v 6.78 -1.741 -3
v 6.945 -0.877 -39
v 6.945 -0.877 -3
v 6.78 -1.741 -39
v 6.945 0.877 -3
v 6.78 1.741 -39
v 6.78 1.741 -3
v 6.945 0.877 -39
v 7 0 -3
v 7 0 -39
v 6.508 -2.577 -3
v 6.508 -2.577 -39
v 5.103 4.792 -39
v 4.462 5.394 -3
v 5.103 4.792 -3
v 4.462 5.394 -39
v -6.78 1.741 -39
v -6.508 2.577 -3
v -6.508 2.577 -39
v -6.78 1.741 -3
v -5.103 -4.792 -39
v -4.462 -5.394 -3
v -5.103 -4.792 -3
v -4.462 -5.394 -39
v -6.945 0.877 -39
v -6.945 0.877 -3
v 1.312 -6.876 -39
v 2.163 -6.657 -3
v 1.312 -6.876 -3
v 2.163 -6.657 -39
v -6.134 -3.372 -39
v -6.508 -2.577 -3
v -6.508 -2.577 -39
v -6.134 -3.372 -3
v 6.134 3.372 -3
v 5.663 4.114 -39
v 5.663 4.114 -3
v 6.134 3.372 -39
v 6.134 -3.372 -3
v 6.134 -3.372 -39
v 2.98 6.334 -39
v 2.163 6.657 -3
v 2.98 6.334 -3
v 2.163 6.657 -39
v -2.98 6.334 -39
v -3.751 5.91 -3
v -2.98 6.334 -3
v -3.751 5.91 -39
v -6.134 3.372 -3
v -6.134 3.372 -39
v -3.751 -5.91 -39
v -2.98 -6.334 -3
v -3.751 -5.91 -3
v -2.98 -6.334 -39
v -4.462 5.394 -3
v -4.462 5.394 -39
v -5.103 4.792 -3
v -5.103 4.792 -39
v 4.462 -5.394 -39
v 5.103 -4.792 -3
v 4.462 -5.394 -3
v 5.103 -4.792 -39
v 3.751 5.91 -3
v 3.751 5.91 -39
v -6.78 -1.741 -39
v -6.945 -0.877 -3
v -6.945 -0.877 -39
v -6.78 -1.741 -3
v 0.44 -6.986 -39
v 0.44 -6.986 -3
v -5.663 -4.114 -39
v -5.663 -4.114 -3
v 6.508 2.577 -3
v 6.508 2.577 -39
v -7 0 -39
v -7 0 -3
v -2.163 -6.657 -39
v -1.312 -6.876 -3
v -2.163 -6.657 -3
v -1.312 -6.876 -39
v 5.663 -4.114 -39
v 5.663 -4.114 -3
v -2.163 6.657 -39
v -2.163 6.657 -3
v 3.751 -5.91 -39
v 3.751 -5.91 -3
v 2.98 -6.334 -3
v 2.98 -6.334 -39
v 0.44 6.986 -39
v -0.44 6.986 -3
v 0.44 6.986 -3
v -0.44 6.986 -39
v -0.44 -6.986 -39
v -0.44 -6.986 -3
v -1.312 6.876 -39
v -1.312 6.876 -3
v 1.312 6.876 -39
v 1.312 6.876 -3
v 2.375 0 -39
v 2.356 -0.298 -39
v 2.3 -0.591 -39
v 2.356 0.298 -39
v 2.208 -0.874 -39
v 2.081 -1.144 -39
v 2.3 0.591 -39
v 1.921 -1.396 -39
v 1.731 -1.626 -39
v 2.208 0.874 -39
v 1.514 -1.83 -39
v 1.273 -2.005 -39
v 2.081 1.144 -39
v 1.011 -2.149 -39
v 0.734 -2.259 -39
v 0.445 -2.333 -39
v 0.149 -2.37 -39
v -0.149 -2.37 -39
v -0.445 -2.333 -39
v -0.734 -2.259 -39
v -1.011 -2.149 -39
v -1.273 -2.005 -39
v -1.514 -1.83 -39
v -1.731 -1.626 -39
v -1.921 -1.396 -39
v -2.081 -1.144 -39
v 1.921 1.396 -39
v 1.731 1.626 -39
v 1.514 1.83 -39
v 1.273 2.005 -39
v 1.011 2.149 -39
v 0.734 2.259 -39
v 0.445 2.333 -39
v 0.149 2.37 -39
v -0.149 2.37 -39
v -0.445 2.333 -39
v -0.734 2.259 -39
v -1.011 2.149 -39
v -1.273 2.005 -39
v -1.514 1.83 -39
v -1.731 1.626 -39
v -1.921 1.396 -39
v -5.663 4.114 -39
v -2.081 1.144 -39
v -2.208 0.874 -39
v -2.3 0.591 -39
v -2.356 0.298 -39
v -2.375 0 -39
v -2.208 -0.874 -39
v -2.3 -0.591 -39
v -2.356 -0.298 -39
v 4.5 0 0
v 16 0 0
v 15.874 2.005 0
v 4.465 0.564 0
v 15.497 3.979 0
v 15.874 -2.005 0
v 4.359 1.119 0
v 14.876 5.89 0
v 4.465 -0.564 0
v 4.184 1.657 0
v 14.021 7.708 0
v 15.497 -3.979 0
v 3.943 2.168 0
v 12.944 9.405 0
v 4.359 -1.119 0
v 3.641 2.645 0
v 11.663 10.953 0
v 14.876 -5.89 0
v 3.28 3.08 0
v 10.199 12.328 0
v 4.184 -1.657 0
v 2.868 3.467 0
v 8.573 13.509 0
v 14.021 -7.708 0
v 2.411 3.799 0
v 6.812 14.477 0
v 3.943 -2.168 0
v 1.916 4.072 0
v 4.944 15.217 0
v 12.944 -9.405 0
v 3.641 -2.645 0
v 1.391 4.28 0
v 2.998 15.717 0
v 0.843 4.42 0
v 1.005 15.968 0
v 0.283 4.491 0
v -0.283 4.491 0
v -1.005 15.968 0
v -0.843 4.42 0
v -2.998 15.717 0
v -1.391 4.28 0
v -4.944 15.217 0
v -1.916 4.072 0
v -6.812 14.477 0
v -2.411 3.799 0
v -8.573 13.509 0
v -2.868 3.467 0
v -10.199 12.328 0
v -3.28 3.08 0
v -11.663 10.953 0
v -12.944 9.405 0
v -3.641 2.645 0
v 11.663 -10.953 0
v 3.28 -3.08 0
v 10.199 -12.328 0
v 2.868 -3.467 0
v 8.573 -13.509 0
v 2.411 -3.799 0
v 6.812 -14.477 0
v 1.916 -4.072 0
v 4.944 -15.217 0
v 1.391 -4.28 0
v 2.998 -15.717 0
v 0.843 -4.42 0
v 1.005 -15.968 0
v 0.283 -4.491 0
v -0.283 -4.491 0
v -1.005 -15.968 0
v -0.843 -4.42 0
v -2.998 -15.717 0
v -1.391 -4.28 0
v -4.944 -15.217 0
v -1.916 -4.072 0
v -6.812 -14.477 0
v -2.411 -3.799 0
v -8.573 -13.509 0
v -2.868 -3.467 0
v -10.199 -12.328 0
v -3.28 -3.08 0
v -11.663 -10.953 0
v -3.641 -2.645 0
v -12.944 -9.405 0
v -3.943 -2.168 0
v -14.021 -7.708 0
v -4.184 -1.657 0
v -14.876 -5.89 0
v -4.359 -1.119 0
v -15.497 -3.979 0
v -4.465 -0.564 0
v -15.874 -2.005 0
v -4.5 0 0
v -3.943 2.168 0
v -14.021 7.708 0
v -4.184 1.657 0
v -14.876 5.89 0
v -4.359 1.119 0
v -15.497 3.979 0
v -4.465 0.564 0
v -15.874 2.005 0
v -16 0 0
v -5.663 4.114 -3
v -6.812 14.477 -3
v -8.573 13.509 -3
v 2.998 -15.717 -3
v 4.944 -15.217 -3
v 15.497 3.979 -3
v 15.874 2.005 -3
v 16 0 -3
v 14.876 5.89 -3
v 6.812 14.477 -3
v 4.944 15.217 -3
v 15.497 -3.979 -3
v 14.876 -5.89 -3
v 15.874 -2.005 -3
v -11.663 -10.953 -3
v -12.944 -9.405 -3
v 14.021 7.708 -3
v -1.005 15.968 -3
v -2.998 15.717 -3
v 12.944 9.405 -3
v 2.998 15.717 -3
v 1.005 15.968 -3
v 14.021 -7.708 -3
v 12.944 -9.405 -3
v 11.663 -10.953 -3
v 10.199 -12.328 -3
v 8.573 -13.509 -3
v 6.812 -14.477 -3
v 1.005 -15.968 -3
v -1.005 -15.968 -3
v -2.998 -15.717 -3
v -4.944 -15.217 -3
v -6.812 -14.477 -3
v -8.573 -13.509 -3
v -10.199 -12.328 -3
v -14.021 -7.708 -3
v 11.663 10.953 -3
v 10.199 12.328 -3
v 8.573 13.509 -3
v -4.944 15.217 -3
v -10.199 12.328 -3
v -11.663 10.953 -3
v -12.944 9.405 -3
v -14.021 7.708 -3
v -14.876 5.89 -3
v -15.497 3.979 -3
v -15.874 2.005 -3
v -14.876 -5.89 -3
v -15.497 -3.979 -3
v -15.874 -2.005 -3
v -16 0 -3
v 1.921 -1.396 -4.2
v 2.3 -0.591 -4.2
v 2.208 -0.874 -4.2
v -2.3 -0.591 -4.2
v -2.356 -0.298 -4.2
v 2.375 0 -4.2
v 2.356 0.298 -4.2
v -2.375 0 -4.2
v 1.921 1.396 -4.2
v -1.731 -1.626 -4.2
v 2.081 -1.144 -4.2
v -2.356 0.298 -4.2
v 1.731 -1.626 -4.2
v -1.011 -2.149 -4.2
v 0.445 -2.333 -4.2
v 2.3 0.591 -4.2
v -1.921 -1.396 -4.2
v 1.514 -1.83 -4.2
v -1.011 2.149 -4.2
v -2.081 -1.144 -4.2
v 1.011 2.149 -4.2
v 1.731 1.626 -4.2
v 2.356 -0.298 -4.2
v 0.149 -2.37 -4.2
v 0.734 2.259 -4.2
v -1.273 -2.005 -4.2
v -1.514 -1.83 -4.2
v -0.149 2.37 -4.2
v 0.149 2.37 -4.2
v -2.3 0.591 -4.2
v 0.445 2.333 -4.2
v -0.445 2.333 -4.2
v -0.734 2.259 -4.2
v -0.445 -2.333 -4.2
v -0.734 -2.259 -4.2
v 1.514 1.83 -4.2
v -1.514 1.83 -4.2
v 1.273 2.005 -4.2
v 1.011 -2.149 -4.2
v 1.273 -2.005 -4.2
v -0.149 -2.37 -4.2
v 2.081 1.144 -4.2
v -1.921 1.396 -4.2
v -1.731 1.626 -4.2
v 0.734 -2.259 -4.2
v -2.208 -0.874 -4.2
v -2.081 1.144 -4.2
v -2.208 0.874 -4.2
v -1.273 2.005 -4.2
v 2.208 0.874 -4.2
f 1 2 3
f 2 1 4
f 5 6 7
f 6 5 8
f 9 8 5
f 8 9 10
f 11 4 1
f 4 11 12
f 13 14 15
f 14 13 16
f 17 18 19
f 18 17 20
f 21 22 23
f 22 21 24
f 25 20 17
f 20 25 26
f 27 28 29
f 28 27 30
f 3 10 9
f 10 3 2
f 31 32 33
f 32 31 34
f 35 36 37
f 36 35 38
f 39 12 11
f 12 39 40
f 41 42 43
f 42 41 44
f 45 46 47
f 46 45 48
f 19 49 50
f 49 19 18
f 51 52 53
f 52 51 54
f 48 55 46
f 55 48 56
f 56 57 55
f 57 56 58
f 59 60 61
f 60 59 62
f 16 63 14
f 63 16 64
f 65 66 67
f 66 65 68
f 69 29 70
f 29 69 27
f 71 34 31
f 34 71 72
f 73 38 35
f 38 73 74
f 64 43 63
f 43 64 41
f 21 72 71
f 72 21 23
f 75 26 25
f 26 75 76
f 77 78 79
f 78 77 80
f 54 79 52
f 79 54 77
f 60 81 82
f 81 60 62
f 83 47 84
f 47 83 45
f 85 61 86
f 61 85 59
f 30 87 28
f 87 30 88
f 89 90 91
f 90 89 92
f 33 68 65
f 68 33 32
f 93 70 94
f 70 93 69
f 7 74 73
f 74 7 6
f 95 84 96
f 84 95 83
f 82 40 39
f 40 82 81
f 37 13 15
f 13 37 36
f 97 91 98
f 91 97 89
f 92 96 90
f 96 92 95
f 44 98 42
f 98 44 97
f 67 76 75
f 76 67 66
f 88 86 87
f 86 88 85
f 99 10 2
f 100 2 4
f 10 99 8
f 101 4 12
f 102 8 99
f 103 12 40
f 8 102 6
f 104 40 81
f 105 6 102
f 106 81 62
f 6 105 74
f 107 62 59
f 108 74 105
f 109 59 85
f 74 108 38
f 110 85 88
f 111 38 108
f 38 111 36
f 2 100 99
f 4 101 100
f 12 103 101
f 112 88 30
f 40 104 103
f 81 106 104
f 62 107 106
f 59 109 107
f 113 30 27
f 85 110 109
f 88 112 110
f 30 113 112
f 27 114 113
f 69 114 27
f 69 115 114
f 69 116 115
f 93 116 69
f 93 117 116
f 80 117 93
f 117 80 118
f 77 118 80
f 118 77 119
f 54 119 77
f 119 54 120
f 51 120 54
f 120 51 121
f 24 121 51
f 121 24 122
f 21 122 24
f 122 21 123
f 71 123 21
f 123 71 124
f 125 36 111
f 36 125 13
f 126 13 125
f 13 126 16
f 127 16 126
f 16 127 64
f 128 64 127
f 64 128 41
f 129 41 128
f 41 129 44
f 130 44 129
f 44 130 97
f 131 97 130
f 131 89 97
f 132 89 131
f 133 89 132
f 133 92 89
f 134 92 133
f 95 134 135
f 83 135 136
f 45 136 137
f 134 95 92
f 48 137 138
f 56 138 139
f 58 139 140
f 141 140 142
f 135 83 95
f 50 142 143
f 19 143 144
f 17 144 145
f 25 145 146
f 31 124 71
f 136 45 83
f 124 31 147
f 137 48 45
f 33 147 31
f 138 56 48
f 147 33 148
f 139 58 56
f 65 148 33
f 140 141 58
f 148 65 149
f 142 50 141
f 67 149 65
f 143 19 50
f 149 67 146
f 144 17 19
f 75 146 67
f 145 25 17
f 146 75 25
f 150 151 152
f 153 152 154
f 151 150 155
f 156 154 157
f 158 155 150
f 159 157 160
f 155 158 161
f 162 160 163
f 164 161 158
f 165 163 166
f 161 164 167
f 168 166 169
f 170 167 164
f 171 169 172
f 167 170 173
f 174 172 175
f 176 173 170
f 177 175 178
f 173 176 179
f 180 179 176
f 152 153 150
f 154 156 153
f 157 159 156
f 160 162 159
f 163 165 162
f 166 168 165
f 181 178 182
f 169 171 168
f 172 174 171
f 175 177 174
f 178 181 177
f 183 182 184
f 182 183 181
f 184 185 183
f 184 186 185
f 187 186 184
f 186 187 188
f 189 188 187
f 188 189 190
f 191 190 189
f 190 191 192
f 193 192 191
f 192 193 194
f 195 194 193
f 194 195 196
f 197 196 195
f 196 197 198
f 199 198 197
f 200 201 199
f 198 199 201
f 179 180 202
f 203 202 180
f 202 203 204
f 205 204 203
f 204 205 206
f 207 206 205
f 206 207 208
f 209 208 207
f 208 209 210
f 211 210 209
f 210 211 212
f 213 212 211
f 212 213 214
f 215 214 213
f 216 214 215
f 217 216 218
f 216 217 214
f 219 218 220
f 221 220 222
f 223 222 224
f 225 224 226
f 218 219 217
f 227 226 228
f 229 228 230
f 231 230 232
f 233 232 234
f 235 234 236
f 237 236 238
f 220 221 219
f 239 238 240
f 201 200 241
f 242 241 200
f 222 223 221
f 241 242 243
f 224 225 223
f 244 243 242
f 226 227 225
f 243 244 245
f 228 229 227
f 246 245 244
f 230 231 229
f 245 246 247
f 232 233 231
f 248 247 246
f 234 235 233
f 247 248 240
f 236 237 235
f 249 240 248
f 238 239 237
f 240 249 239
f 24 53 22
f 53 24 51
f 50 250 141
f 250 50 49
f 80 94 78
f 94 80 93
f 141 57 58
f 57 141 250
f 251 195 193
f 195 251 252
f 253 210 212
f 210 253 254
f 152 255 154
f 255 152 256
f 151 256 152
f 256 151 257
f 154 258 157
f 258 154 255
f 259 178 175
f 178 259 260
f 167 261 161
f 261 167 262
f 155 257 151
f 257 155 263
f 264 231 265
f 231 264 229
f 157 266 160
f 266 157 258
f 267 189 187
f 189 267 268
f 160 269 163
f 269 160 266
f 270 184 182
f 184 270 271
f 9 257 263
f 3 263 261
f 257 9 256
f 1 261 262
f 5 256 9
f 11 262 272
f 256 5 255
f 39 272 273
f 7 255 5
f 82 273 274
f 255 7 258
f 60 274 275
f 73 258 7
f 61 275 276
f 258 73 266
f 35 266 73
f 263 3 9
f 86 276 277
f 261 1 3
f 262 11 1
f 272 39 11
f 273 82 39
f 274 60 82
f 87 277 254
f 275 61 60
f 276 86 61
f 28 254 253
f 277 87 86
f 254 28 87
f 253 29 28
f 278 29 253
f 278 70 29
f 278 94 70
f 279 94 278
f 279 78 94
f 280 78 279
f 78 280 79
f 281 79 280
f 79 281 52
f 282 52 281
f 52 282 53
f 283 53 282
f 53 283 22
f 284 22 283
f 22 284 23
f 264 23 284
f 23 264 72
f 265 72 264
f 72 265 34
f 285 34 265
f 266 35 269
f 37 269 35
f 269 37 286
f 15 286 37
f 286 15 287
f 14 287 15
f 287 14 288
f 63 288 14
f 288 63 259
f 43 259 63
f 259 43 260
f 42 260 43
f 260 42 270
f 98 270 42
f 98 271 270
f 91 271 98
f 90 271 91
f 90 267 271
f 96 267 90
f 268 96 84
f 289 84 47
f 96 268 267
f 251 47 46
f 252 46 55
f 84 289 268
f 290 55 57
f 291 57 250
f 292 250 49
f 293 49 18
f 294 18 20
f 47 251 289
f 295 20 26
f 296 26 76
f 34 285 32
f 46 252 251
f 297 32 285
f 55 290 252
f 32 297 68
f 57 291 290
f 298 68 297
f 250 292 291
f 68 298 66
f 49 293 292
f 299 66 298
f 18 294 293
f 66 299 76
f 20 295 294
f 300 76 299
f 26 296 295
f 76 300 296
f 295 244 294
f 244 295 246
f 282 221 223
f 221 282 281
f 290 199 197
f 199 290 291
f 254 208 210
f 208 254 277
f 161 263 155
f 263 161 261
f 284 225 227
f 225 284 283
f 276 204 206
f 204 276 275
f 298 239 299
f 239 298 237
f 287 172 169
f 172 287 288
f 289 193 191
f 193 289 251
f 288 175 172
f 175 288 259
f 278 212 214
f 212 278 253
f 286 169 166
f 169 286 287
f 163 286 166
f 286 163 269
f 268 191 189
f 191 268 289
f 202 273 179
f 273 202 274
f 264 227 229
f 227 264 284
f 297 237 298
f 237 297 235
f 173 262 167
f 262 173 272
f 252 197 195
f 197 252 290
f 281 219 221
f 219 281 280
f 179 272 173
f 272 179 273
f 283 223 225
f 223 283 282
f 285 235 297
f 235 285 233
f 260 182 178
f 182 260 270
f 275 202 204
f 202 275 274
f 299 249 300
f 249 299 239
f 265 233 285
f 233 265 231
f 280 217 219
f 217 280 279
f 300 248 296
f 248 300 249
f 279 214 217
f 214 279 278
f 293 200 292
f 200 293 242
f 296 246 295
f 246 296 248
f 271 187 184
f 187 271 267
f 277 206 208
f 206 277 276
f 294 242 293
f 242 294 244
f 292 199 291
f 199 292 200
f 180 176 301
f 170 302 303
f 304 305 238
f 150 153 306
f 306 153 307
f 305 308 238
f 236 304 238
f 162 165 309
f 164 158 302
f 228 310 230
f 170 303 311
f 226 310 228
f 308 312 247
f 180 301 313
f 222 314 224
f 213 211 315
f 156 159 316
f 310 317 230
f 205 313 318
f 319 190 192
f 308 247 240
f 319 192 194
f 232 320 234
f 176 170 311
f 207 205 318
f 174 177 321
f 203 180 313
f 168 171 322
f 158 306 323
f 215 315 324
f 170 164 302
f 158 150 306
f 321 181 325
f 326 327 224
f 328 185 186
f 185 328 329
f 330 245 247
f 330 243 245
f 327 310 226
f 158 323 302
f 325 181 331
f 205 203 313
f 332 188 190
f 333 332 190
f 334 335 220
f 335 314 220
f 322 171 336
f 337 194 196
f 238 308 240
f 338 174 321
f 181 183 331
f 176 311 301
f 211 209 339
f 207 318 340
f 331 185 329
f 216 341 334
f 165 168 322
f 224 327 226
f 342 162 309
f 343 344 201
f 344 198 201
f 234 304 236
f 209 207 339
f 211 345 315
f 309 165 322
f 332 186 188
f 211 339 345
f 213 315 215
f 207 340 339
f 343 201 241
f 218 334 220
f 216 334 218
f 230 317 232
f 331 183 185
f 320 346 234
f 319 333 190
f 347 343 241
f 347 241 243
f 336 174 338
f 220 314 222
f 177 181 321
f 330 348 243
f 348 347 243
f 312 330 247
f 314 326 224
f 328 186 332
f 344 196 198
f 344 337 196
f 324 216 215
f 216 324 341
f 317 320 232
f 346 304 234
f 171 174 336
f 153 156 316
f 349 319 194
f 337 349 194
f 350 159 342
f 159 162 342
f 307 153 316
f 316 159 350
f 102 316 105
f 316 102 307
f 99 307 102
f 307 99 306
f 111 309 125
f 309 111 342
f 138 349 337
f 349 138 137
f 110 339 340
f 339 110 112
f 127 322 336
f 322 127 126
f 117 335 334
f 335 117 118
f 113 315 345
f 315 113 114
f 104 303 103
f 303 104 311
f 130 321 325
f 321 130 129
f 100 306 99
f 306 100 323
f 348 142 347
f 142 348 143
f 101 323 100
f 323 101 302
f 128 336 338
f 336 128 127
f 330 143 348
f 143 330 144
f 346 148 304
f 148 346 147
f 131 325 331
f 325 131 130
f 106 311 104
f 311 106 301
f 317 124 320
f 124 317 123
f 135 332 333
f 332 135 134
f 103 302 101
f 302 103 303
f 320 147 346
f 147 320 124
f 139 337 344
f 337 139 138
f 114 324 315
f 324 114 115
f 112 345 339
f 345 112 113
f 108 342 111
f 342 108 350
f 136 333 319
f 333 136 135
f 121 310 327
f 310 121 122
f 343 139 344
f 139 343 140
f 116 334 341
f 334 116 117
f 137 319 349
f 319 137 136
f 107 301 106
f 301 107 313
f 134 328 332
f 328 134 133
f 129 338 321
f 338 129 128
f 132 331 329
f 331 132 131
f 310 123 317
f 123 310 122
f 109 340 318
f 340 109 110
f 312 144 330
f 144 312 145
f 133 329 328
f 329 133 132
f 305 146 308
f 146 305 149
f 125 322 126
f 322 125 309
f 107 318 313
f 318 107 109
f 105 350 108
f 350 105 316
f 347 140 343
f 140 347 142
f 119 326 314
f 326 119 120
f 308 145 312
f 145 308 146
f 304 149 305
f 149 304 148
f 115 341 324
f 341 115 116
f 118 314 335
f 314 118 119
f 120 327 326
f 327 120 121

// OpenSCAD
$fn = 50;


difference() {
	union() {
		translate(v = [0, 0, -39.0000000000]) {
			cylinder(h = 39, r = 7.0000000000);
		}
		translate(v = [0, 0, -3.0000000000]) {
			cylinder(h = 3, r = 16.0000000000);
		}
	}
	union() {
		translate(v = [0, 0, 0]) {
			rotate(a = [0, 0, 0]) {
				difference() {
					union() {
						#translate(v = [0, 0, -39.0000000000]) {
							cylinder(h = 39, r = 2.2500000000);
						}
						#translate(v = [0, 0, -4.2000000000]) {
							cylinder(h = 4.2000000000, r = 7.0000000000, r1 = 2.3750000000, r2 = 4.5000000000);
						}
						#translate(v = [0, 0, -39.0000000000]) {
							cylinder(h = 39, r = 2.3750000000);
						}
						#translate(v = [0, 0, -39.0000000000]) {
							cylinder(h = 39, r = 2.2500000000);
						}
					}
					union();
				}
			}
		}
	}
}
